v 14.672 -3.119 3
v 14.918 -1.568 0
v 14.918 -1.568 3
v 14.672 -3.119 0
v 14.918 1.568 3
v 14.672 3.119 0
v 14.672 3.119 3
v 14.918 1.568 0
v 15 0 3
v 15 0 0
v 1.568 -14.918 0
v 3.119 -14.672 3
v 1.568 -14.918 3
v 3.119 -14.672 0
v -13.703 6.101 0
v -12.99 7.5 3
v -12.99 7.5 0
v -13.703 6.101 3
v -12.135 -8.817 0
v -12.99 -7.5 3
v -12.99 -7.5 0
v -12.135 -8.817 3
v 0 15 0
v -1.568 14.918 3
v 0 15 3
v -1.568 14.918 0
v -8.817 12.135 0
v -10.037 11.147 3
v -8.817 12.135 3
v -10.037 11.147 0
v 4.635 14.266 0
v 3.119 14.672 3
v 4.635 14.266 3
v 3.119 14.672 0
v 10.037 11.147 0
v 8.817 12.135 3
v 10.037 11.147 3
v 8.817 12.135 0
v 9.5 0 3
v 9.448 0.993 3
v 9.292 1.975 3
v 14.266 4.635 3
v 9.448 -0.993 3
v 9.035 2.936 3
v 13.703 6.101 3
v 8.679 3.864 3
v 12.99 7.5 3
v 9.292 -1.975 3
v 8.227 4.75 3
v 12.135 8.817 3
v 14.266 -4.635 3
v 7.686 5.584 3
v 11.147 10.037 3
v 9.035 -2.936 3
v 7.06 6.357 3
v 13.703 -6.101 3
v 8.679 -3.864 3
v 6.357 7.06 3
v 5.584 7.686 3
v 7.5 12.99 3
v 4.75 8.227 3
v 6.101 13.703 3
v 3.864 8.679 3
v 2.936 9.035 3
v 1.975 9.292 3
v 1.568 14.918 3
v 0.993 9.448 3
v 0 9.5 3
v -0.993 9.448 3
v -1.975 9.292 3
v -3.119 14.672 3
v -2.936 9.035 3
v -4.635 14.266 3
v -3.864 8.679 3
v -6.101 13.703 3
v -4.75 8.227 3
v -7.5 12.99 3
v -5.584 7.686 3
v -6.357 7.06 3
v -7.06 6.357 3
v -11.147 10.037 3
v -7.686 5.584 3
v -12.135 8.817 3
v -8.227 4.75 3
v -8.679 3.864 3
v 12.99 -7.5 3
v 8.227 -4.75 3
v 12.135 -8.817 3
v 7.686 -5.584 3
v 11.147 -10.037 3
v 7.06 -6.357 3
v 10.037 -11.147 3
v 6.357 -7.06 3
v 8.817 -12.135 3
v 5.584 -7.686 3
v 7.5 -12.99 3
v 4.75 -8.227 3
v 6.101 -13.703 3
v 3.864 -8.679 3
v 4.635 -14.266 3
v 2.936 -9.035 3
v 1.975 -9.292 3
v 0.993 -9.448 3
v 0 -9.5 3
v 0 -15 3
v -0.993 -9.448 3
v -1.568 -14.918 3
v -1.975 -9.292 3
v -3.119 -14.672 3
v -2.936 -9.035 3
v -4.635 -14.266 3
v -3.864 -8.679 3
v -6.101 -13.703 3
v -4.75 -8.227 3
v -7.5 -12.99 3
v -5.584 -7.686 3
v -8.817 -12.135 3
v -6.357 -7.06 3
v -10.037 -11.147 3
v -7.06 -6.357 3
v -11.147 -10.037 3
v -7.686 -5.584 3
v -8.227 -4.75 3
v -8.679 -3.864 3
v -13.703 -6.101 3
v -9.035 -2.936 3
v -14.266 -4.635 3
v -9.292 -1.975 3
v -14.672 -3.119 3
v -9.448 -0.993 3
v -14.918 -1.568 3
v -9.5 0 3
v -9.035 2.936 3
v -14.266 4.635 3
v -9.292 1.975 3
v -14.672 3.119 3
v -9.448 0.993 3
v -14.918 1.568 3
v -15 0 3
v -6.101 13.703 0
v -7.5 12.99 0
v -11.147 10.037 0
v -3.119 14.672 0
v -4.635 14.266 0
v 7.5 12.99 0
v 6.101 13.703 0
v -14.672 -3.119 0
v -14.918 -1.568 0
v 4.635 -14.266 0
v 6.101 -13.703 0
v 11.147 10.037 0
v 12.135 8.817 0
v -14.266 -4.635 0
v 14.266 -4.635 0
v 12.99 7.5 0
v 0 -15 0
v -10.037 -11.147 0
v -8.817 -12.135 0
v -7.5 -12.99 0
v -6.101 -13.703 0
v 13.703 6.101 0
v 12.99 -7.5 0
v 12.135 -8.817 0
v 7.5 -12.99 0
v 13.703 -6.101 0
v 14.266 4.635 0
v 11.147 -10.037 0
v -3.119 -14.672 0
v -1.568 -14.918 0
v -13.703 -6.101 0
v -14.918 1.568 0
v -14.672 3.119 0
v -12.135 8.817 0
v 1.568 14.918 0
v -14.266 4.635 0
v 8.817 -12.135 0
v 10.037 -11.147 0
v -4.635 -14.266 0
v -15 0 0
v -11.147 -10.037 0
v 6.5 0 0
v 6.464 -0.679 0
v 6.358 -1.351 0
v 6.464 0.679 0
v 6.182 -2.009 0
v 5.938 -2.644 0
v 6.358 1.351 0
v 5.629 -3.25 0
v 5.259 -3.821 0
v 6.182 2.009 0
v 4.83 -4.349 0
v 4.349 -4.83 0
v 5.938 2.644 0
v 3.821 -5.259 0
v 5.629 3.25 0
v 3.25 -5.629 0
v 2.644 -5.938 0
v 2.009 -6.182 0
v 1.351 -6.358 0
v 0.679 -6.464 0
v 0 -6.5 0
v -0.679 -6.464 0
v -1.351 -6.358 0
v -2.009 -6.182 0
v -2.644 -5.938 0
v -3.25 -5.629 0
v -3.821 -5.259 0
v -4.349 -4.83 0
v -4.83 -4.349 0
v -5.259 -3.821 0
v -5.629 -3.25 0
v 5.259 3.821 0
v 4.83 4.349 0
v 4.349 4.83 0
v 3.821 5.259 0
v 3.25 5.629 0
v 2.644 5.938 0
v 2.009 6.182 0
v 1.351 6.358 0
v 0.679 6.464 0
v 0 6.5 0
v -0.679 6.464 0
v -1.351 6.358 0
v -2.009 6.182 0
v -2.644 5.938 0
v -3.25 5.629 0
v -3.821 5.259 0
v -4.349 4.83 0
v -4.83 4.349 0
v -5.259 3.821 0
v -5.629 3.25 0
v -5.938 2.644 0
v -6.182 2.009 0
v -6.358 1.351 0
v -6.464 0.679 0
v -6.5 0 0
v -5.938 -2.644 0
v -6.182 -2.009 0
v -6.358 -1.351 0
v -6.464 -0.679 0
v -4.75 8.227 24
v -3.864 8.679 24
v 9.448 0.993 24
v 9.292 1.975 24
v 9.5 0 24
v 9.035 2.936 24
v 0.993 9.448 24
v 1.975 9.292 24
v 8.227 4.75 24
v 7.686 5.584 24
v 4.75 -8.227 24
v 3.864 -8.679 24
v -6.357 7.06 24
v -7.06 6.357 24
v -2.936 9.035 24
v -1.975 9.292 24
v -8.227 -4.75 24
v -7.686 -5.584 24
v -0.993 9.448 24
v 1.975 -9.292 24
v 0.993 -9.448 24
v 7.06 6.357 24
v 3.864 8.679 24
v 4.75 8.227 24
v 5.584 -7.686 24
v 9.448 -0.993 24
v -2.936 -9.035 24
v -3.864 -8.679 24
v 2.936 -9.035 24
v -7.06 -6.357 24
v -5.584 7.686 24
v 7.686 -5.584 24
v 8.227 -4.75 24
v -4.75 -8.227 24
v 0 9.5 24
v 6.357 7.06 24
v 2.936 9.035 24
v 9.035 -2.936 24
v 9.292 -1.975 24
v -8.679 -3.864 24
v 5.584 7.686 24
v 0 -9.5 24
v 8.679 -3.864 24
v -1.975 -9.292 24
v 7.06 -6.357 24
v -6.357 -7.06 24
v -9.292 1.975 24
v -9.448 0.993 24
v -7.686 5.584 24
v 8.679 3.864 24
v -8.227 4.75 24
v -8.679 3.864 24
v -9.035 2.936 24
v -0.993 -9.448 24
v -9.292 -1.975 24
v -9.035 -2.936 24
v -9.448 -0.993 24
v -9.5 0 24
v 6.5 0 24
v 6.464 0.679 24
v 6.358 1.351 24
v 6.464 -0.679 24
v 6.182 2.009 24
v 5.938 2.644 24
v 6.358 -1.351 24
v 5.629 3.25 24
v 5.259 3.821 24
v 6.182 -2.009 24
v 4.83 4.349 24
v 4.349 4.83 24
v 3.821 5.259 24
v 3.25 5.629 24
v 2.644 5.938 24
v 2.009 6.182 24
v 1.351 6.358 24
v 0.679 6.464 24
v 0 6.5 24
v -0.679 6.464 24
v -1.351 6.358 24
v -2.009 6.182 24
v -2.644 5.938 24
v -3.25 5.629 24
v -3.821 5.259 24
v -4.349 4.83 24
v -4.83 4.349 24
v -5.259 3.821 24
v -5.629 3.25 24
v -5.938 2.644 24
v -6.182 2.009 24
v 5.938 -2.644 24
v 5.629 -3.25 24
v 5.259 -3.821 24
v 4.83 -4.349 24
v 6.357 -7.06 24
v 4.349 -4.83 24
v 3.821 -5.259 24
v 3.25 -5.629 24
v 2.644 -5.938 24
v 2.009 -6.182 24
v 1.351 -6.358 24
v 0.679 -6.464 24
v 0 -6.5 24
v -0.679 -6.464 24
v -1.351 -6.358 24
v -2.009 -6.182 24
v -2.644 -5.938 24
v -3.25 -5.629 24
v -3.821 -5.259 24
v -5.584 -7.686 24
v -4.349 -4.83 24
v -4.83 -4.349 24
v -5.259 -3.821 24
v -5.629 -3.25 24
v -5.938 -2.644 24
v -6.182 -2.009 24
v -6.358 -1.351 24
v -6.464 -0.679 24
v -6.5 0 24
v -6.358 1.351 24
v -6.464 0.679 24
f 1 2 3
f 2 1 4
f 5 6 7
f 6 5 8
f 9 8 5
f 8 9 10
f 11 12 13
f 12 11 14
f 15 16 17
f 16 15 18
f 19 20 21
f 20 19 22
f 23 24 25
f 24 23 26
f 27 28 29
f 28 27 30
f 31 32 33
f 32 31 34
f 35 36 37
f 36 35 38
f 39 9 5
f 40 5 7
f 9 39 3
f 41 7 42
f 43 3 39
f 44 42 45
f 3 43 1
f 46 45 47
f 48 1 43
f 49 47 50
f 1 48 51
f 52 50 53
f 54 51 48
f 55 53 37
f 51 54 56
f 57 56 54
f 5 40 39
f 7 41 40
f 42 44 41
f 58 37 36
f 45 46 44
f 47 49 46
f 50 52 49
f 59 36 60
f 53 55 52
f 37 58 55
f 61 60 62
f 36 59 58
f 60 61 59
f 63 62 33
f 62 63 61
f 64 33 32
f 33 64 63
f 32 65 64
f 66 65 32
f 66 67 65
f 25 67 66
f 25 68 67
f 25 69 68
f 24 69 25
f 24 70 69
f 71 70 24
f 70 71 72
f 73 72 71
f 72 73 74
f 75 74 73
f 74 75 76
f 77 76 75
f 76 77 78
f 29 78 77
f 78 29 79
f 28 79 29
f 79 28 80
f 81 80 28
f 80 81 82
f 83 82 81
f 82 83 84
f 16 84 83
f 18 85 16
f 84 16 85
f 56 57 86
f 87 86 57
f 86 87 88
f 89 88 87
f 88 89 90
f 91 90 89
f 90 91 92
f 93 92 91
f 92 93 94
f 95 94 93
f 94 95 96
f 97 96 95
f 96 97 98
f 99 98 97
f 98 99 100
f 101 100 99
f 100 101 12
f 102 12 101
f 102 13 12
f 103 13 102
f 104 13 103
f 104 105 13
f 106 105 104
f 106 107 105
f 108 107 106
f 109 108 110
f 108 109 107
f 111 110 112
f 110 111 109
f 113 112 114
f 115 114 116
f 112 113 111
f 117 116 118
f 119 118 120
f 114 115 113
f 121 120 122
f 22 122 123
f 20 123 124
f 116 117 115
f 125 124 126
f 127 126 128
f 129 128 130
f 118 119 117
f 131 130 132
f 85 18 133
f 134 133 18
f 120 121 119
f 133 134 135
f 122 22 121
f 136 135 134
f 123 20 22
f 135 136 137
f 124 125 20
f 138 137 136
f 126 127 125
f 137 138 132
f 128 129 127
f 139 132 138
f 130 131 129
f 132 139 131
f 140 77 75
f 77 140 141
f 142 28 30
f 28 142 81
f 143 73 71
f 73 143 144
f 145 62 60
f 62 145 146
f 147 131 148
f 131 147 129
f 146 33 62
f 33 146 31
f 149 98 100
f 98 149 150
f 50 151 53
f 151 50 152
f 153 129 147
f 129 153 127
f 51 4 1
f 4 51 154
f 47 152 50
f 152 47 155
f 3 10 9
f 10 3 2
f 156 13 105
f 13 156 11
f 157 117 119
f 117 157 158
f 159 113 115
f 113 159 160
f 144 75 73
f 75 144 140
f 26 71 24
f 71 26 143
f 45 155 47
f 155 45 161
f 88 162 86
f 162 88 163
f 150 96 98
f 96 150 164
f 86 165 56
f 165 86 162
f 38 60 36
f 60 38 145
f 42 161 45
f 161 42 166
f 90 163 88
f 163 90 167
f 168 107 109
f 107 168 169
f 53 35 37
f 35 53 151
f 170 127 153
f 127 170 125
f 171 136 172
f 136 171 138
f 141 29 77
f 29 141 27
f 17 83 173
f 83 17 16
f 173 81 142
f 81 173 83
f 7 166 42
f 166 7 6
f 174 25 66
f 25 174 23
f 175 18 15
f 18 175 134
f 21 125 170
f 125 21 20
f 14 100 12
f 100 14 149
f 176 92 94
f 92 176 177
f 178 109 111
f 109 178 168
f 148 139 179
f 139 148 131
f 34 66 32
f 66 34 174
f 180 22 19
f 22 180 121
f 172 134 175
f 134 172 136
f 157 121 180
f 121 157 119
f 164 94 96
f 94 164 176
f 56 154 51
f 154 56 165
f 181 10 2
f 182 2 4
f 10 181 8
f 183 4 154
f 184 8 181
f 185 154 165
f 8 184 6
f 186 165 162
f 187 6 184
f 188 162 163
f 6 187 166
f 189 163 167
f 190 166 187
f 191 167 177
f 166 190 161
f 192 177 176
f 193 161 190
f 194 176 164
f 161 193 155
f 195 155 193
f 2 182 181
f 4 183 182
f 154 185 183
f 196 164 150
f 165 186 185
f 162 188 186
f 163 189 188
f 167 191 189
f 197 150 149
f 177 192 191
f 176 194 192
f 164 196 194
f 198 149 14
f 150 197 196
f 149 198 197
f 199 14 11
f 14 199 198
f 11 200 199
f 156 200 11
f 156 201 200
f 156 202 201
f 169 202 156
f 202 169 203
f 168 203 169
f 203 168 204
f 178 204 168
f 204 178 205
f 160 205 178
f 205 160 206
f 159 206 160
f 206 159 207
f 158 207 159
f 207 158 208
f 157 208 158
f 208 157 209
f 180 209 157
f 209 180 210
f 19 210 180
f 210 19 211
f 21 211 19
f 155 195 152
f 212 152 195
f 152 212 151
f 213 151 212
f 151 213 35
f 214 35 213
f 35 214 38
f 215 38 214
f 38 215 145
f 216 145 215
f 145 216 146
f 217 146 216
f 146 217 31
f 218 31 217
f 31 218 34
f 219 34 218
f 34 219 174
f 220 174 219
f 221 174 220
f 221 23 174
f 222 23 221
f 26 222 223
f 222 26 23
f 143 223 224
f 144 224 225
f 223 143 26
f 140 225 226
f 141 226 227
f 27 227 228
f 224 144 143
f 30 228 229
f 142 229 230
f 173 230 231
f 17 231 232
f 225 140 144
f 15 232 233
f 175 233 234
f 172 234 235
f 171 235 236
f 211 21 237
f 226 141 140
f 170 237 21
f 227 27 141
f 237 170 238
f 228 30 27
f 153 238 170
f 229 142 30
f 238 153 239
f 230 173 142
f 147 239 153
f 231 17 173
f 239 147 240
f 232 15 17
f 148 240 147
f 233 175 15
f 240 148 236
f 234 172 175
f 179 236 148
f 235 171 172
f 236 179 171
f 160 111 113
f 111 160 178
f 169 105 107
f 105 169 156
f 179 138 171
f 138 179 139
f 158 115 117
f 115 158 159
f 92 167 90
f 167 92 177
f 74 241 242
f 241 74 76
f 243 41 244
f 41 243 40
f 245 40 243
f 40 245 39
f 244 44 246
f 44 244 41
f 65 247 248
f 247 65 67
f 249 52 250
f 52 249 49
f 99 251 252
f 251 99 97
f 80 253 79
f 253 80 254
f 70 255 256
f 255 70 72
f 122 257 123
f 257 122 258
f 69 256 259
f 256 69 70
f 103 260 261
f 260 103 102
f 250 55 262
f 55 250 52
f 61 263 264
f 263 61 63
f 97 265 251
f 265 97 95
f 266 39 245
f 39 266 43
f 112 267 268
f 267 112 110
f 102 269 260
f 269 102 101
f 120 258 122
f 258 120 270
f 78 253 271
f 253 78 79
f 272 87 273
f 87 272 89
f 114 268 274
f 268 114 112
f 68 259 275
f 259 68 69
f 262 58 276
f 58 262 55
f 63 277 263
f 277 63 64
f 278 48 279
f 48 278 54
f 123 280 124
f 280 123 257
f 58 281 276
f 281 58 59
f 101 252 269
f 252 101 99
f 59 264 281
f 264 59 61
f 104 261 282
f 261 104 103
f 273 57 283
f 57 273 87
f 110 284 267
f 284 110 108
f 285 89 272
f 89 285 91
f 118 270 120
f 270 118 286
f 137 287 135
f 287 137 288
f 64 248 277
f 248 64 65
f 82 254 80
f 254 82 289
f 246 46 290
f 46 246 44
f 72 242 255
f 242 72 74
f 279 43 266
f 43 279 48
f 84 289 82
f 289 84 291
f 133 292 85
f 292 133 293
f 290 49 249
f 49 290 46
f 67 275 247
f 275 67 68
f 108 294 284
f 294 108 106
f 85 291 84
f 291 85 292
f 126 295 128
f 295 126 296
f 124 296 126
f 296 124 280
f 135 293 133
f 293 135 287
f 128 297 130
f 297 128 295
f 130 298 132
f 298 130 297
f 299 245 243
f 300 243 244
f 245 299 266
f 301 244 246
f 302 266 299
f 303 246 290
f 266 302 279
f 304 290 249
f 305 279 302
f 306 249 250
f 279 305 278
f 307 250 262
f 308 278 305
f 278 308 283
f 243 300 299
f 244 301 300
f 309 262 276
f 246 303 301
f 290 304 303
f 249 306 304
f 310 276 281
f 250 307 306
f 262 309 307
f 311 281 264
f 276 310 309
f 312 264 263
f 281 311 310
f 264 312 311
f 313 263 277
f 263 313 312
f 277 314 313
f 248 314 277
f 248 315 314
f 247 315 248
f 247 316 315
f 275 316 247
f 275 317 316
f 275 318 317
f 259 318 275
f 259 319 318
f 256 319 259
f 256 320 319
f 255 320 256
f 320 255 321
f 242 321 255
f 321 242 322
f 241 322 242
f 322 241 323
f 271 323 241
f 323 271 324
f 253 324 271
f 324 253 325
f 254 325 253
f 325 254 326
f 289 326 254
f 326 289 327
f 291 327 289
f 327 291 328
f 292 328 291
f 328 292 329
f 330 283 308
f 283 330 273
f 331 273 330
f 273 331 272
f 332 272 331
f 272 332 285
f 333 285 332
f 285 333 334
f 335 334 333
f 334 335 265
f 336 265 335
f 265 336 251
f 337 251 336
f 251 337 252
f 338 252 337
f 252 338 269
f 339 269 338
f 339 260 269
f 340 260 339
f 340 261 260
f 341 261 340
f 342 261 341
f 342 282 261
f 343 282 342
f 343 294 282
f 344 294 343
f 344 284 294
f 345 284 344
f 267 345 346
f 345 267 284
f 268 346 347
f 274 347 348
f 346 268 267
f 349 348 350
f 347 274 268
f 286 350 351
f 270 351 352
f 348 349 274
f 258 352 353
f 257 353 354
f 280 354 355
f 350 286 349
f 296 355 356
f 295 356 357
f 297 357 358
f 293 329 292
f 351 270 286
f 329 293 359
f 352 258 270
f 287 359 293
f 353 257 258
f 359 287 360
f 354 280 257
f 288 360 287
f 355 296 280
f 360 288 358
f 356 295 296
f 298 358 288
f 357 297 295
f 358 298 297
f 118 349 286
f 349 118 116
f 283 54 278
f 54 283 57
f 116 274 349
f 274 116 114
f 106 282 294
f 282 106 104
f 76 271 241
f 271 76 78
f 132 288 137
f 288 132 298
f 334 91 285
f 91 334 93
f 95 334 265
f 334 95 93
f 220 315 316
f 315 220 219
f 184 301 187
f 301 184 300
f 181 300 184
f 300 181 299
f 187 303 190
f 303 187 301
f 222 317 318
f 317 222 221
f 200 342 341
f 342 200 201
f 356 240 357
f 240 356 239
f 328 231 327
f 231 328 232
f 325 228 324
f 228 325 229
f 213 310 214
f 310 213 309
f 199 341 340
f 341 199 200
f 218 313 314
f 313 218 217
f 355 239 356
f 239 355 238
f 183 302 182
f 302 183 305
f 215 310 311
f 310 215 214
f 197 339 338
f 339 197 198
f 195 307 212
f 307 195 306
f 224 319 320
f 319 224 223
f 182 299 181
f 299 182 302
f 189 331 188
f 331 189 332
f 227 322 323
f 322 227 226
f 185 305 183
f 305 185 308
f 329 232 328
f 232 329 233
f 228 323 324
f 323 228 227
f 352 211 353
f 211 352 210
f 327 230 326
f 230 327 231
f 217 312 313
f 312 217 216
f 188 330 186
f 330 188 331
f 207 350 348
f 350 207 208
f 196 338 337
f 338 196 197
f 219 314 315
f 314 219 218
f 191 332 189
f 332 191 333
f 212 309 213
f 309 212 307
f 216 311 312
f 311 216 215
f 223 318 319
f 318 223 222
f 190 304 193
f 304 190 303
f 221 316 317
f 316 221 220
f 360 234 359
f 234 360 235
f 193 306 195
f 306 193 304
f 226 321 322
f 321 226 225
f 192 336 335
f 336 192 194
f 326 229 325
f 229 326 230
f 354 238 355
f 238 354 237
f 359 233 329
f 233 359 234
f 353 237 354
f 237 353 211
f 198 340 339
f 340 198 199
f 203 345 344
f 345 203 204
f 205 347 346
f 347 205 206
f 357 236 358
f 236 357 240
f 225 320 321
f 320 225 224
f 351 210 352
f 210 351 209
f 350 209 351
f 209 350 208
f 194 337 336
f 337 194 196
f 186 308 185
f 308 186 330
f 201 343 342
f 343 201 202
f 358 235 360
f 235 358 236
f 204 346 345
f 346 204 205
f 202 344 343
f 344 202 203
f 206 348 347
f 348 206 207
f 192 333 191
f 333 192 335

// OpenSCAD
// Threaded mounting boss.
$fn = 60;
eps = 0.02;
thread_d = 13;
base_d = 30;
height = 24;
difference() { union() { cylinder(d=base_d,h=3); cylinder(d=thread_d+6,h=height); } translate([0,0,-eps]) cylinder(d=thread_d,h=height+2*eps); }
